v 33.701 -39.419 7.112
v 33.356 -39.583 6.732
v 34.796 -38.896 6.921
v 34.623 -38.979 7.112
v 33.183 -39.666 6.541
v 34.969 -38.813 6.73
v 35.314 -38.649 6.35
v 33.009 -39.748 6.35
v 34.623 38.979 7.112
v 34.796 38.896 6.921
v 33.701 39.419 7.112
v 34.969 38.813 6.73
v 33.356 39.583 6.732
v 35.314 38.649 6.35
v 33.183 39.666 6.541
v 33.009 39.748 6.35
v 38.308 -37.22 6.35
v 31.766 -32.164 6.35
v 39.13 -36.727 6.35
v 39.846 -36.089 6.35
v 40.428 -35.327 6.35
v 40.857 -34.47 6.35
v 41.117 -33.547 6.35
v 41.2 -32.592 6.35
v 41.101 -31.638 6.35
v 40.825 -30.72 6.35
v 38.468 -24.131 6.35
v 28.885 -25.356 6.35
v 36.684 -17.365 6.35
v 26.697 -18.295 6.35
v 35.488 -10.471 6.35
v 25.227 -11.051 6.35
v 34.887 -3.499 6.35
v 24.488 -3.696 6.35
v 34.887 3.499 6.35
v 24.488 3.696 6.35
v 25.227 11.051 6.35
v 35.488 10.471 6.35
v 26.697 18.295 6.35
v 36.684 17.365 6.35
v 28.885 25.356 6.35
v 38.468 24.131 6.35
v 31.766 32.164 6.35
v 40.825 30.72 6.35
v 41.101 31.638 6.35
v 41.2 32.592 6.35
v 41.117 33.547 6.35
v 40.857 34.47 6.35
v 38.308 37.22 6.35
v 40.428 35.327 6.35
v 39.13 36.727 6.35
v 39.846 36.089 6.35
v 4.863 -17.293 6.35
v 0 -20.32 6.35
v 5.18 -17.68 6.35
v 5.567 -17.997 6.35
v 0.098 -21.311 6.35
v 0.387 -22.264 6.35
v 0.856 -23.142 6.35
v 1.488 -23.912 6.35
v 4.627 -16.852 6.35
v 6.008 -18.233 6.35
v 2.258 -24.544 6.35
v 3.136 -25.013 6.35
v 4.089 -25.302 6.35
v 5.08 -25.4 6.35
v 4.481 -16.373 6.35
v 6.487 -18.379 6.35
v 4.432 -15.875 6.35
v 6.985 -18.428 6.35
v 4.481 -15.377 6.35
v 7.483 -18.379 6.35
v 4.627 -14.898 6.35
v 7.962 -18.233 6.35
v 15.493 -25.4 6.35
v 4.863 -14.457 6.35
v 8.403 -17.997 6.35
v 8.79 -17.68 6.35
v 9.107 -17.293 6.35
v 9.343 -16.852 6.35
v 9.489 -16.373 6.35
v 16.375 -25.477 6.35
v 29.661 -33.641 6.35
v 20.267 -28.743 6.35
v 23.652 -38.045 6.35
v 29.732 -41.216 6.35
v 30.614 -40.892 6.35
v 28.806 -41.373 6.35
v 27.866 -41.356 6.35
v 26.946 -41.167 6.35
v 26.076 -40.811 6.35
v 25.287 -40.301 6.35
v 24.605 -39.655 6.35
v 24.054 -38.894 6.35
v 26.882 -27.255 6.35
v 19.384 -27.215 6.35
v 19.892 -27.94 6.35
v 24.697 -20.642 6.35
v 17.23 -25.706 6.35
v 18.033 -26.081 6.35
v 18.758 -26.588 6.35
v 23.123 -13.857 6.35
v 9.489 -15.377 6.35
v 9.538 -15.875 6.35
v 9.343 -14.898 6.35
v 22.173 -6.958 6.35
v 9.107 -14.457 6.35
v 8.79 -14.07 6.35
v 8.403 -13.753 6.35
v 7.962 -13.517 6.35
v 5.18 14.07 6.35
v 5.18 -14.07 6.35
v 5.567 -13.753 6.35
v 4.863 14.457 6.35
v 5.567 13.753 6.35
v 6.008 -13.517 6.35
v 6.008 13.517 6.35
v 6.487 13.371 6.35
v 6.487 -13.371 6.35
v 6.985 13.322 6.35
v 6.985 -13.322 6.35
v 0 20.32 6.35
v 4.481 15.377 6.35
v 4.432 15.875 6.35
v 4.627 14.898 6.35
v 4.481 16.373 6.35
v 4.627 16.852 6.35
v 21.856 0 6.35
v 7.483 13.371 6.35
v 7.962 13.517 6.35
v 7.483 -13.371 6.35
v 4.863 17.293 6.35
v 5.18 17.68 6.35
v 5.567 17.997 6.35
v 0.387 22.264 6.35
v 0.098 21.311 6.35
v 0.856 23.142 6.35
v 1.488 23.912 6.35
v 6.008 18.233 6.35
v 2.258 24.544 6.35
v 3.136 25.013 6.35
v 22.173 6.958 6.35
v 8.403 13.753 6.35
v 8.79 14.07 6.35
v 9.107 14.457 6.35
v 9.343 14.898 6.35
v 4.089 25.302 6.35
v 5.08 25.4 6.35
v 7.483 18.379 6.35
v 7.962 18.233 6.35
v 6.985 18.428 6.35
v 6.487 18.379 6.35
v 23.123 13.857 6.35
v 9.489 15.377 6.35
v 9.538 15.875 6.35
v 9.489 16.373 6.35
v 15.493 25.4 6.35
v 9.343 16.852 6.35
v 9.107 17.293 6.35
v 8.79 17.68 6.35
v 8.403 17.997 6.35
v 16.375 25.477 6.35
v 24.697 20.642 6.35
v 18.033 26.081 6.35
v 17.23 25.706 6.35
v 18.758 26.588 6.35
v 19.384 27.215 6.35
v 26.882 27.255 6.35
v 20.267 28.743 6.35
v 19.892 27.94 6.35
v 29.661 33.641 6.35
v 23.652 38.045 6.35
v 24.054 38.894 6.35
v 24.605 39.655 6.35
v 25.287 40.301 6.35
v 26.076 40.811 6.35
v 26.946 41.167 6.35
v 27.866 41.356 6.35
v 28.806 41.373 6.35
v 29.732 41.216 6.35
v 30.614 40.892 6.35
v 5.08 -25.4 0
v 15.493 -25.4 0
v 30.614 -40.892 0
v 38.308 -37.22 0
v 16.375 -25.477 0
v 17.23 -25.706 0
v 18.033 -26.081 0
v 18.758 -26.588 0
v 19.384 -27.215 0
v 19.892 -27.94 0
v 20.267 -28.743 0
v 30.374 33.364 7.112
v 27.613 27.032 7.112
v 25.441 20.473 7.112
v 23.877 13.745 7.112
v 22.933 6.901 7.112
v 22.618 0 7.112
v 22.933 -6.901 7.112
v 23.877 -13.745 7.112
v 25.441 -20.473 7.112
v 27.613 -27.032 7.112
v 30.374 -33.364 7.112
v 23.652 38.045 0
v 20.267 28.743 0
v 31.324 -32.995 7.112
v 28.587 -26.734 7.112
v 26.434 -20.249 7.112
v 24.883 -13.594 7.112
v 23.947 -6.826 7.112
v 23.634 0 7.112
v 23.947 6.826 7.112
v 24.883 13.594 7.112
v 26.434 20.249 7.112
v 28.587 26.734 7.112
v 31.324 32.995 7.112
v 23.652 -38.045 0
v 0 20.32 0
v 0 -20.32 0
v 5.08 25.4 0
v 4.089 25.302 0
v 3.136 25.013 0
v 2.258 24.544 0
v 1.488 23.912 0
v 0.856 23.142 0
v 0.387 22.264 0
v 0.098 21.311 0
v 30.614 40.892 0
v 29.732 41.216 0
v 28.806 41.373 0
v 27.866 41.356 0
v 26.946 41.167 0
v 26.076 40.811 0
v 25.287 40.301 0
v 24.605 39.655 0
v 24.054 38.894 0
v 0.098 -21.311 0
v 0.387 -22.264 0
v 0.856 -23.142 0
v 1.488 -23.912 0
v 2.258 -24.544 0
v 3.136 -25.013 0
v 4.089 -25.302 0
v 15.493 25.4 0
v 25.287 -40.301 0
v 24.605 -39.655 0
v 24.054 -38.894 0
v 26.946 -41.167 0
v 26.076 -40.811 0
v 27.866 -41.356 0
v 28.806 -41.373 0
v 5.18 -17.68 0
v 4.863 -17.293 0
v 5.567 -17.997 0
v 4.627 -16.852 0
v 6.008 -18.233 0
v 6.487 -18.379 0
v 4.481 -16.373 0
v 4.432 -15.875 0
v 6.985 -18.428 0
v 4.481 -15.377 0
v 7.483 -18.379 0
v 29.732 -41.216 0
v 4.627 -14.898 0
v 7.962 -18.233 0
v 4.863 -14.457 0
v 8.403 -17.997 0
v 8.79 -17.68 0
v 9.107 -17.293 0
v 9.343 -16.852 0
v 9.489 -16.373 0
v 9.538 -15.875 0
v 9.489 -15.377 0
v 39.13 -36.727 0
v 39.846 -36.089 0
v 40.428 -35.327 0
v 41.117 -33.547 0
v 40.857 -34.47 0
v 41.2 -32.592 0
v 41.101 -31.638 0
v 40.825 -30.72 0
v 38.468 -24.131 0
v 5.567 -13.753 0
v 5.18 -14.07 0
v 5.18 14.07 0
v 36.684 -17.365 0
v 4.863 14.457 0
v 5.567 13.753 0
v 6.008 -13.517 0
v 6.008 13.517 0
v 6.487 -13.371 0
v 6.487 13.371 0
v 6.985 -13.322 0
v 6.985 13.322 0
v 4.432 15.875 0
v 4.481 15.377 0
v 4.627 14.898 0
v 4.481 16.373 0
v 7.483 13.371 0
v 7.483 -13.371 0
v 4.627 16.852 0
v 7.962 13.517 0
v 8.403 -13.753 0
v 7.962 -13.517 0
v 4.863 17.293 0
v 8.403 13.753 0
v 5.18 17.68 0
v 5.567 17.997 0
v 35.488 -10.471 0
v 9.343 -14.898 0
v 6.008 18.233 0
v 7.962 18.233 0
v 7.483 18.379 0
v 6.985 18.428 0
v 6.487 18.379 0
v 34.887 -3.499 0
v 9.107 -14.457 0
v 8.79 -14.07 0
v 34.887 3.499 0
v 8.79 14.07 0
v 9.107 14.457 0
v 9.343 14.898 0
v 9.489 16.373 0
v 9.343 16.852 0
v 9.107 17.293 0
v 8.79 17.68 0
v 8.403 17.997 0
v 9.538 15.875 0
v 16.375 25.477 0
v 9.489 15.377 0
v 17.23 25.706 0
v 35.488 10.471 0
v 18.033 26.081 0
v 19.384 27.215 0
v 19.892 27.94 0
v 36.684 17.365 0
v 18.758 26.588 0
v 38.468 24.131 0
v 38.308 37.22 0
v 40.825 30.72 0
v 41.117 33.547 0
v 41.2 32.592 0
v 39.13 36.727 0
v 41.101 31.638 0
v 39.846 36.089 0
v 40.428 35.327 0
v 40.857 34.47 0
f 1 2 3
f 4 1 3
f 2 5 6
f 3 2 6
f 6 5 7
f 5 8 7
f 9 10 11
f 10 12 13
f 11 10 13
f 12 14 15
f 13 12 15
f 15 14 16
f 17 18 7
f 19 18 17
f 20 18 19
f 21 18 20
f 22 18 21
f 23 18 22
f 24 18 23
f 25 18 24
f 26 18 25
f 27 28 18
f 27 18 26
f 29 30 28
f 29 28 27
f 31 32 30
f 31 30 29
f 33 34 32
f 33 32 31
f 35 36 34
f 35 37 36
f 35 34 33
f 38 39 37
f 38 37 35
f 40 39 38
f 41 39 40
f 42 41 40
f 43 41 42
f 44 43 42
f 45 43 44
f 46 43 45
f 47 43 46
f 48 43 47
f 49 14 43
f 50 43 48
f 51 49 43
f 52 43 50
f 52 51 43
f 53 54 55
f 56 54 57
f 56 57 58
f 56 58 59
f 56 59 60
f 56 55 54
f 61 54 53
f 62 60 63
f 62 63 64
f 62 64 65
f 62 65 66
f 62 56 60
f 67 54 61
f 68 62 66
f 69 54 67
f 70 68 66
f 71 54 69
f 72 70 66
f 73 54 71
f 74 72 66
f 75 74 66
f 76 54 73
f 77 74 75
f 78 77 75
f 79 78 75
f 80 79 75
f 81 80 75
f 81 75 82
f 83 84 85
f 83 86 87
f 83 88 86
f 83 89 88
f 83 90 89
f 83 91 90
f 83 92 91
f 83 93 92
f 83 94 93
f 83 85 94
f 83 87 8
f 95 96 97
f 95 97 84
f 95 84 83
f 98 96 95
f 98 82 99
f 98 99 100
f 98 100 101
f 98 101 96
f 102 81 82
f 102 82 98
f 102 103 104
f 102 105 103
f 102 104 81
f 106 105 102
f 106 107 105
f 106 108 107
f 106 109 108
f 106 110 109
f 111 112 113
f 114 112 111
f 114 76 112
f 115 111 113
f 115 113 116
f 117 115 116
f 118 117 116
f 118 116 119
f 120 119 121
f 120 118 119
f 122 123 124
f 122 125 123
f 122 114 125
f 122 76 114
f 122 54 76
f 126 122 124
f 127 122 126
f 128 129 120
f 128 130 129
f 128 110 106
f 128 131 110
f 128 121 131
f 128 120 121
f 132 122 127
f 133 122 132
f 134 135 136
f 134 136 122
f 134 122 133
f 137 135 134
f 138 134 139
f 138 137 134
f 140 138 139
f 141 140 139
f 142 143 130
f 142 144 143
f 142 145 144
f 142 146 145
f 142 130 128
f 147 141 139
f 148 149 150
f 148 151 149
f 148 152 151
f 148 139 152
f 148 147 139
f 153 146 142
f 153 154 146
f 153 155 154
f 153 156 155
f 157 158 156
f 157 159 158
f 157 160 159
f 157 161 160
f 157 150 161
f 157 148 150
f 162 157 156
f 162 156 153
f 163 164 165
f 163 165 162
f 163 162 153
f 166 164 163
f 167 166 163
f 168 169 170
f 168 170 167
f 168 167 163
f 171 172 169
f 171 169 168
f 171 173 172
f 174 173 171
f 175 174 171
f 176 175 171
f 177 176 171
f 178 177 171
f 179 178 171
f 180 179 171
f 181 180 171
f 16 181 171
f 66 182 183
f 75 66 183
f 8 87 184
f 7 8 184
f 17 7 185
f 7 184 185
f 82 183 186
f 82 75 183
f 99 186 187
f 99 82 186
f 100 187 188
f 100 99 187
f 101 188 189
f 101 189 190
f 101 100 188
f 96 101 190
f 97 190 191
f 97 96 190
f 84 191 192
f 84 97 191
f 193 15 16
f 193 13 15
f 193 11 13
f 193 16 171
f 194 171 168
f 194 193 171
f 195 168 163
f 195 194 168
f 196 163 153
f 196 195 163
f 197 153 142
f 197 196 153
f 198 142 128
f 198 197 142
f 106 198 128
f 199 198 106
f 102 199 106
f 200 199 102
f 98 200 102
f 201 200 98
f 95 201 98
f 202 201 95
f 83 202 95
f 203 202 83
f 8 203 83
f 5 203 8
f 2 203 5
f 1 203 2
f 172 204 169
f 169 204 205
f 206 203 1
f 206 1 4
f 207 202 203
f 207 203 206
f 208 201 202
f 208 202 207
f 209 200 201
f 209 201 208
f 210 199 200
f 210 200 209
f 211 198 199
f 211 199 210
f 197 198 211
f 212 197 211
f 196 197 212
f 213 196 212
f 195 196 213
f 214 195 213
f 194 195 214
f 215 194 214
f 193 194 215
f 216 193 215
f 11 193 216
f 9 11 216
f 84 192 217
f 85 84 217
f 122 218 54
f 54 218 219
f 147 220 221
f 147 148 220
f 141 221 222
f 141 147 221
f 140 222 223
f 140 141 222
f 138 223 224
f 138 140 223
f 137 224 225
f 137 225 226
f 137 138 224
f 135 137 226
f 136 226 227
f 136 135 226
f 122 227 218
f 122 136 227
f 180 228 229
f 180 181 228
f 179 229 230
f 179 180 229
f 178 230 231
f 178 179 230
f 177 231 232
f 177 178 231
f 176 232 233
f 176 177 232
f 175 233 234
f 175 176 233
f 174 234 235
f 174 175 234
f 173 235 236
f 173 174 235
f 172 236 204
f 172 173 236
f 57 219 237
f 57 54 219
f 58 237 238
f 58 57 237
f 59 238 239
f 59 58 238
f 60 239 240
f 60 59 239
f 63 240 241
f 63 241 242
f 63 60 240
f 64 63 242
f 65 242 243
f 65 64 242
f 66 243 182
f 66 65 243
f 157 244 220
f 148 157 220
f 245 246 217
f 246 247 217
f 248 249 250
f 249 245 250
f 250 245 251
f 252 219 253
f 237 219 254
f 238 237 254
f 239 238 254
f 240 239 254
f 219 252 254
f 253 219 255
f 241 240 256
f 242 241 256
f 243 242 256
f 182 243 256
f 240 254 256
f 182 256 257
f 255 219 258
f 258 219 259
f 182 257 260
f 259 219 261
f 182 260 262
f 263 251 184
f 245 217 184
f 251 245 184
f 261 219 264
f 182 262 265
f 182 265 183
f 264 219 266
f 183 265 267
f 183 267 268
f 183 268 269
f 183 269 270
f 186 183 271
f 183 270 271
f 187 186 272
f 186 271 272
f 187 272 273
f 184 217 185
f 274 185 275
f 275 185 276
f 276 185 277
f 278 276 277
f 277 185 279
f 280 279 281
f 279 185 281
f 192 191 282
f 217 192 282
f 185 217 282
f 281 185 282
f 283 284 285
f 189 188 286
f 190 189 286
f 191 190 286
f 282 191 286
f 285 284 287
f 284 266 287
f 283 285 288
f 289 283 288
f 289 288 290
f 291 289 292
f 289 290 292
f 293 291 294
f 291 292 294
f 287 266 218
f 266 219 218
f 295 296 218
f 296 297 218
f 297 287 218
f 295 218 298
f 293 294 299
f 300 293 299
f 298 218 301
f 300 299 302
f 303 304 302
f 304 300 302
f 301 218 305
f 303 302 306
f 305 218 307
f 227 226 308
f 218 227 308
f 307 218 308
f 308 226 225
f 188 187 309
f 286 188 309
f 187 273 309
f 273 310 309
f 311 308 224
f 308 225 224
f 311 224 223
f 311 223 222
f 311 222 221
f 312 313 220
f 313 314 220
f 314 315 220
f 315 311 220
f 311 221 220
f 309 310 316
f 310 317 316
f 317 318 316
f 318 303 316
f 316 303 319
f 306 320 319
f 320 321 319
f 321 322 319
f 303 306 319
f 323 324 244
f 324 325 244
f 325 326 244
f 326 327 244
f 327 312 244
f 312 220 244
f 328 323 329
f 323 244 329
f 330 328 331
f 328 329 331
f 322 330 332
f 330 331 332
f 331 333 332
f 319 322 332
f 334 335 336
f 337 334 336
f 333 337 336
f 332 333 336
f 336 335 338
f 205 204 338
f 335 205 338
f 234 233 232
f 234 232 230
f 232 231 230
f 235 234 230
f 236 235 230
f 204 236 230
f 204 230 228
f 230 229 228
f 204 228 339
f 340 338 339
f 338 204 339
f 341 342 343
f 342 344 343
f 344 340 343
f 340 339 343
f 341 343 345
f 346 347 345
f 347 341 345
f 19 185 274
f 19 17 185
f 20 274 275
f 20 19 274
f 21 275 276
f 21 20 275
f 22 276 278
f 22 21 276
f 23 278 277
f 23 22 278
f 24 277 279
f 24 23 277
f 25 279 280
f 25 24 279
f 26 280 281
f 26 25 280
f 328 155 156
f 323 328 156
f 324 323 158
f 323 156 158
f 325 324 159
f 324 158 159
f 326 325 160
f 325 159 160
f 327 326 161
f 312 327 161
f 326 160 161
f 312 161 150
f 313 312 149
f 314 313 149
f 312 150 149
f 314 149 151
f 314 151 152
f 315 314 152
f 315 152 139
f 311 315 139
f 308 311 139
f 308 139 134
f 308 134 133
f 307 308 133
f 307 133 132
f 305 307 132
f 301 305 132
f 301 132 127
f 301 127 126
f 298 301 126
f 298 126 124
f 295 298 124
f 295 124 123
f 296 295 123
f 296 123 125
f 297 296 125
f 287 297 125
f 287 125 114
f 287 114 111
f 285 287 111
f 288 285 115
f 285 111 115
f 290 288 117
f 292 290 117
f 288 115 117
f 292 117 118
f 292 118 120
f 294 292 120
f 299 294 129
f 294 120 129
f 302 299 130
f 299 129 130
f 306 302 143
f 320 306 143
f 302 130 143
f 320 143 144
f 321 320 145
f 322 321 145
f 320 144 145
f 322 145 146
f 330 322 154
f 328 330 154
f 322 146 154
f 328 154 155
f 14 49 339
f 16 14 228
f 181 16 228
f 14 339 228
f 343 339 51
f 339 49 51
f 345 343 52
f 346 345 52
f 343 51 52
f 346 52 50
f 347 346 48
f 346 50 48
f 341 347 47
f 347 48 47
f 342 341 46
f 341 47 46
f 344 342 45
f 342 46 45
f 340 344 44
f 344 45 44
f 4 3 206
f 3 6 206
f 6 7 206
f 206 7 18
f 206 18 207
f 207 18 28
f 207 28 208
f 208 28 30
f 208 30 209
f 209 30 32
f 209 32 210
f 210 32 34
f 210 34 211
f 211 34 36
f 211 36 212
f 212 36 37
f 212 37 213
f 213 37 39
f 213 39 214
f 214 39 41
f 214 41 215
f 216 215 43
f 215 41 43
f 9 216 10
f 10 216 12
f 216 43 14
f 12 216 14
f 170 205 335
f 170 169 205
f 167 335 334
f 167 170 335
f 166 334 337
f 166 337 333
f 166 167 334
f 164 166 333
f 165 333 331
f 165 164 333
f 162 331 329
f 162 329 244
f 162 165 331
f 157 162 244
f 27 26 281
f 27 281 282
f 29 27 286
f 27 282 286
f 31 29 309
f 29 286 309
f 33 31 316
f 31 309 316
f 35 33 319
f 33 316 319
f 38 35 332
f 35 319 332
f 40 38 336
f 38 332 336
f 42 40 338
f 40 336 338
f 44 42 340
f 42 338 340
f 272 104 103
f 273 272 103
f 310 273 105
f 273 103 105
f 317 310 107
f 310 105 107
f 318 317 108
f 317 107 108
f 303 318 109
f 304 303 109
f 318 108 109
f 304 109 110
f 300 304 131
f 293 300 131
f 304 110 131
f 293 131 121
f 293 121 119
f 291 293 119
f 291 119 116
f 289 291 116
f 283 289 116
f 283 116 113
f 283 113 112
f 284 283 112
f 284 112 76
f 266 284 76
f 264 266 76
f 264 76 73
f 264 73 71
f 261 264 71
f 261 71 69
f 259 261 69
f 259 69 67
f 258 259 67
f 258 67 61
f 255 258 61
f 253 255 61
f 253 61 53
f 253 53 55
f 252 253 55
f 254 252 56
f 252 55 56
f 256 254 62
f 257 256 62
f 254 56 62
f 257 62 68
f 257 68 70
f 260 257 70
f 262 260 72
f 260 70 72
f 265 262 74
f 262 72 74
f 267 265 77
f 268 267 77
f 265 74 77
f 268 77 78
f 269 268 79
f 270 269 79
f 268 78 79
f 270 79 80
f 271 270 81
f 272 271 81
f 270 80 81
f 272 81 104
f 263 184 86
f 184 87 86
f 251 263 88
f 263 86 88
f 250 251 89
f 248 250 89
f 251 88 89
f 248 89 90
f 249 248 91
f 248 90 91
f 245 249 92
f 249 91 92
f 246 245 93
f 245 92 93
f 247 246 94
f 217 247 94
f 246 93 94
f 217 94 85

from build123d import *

# Parameters (mm, degrees)
F1_DEPTH = 6.35
F3_DEPTH = 0.762
F4_SIZE  = 0.76199
F5_R     = 2.5527
F6_DEPTH = 6.351
F7_R     = 5.08


# Not quite as in the source:
# - a fillet or chamfer is up to 0.001 mm smaller than in the source, because OpenCascade refuses the exact size


with BuildPart() as f1:
    # F0 (on Top) → F1 (new body)
    with BuildSketch(Plane.XY):
        with BuildLine():
            Line((19.05, 25.4), (0, 25.4))
            Line((0, 25.4), (0, -25.4))
            Line((0, -25.4), (19.05, -25.4))
            Line((19.05, -25.4), (25.5654837304, -43.301144426))
            Line((25.5654837304, -43.301144426), (42.7578812746, -35.0960261037))
            ThreePointArc((42.7578812746, -35.0960261037), (34.8122963703, 0), (42.7578812746, 35.0960261037))
            Line((42.7578812746, 35.0960261037), (25.5654837304, 43.301144426))
            Line((25.5654837304, 43.301144426), (19.05, 25.4))
        make_face()
    extrude(amount=F1_DEPTH)

    # F2 (on face) → F3 (join)
    with BuildSketch(Plane.XY.offset(6.35)):
        with BuildLine():
            Line((35.3141257953, 38.64857858), (33.0094497647, 39.7484914617))
            ThreePointArc((33.0094497647, 39.7484914617), (21.8558198534, 0), (33.0094497647, -39.7484914617))
            Line((33.0094497647, -39.7484914617), (35.3141257953, -38.64857858))
            ThreePointArc((35.3141257953, -38.64857858), (24.3958198534, 0), (35.3141257953, 38.64857858))
        make_face()
    extrude(amount=F3_DEPTH)

    # F4 (size 0.762 in the source; OpenCascade refuses exactly that, so slightly less here)
    f4_edges = [f1.edges().sort_by_distance(p)[0] for p in [
        (21.85582, 0, 7.112),
        (24.39582, 0, 7.112),
    ]]
    chamfer(f4_edges, length=F4_SIZE)

    # F5 (on face) → F6 (cut, through all)
    with BuildSketch(Plane.XY.offset(6.35)):
        with Locations((6.985, 15.875)):
            Circle(F5_R)
        with Locations((6.985, -15.875)):
            Circle(F5_R)
    extrude(amount=-F6_DEPTH, mode=Mode.SUBTRACT)

    # F7
    f7_edges = [f1.edges().sort_by_distance(p)[0] for p in [
        (0, -25.4, 3.175),
        (19.05, -25.4, 3.175),
        (25.565484, -43.301144, 3.175),
        (42.757881, -35.096026, 3.175),
        (0, 25.4, 3.175),
        (19.05, 25.4, 3.175),
        (25.565484, 43.301144, 3.175),
        (42.757881, 35.096026, 3.175),
    ]]
    fillet(f7_edges, radius=F7_R)


solid = f1.part
